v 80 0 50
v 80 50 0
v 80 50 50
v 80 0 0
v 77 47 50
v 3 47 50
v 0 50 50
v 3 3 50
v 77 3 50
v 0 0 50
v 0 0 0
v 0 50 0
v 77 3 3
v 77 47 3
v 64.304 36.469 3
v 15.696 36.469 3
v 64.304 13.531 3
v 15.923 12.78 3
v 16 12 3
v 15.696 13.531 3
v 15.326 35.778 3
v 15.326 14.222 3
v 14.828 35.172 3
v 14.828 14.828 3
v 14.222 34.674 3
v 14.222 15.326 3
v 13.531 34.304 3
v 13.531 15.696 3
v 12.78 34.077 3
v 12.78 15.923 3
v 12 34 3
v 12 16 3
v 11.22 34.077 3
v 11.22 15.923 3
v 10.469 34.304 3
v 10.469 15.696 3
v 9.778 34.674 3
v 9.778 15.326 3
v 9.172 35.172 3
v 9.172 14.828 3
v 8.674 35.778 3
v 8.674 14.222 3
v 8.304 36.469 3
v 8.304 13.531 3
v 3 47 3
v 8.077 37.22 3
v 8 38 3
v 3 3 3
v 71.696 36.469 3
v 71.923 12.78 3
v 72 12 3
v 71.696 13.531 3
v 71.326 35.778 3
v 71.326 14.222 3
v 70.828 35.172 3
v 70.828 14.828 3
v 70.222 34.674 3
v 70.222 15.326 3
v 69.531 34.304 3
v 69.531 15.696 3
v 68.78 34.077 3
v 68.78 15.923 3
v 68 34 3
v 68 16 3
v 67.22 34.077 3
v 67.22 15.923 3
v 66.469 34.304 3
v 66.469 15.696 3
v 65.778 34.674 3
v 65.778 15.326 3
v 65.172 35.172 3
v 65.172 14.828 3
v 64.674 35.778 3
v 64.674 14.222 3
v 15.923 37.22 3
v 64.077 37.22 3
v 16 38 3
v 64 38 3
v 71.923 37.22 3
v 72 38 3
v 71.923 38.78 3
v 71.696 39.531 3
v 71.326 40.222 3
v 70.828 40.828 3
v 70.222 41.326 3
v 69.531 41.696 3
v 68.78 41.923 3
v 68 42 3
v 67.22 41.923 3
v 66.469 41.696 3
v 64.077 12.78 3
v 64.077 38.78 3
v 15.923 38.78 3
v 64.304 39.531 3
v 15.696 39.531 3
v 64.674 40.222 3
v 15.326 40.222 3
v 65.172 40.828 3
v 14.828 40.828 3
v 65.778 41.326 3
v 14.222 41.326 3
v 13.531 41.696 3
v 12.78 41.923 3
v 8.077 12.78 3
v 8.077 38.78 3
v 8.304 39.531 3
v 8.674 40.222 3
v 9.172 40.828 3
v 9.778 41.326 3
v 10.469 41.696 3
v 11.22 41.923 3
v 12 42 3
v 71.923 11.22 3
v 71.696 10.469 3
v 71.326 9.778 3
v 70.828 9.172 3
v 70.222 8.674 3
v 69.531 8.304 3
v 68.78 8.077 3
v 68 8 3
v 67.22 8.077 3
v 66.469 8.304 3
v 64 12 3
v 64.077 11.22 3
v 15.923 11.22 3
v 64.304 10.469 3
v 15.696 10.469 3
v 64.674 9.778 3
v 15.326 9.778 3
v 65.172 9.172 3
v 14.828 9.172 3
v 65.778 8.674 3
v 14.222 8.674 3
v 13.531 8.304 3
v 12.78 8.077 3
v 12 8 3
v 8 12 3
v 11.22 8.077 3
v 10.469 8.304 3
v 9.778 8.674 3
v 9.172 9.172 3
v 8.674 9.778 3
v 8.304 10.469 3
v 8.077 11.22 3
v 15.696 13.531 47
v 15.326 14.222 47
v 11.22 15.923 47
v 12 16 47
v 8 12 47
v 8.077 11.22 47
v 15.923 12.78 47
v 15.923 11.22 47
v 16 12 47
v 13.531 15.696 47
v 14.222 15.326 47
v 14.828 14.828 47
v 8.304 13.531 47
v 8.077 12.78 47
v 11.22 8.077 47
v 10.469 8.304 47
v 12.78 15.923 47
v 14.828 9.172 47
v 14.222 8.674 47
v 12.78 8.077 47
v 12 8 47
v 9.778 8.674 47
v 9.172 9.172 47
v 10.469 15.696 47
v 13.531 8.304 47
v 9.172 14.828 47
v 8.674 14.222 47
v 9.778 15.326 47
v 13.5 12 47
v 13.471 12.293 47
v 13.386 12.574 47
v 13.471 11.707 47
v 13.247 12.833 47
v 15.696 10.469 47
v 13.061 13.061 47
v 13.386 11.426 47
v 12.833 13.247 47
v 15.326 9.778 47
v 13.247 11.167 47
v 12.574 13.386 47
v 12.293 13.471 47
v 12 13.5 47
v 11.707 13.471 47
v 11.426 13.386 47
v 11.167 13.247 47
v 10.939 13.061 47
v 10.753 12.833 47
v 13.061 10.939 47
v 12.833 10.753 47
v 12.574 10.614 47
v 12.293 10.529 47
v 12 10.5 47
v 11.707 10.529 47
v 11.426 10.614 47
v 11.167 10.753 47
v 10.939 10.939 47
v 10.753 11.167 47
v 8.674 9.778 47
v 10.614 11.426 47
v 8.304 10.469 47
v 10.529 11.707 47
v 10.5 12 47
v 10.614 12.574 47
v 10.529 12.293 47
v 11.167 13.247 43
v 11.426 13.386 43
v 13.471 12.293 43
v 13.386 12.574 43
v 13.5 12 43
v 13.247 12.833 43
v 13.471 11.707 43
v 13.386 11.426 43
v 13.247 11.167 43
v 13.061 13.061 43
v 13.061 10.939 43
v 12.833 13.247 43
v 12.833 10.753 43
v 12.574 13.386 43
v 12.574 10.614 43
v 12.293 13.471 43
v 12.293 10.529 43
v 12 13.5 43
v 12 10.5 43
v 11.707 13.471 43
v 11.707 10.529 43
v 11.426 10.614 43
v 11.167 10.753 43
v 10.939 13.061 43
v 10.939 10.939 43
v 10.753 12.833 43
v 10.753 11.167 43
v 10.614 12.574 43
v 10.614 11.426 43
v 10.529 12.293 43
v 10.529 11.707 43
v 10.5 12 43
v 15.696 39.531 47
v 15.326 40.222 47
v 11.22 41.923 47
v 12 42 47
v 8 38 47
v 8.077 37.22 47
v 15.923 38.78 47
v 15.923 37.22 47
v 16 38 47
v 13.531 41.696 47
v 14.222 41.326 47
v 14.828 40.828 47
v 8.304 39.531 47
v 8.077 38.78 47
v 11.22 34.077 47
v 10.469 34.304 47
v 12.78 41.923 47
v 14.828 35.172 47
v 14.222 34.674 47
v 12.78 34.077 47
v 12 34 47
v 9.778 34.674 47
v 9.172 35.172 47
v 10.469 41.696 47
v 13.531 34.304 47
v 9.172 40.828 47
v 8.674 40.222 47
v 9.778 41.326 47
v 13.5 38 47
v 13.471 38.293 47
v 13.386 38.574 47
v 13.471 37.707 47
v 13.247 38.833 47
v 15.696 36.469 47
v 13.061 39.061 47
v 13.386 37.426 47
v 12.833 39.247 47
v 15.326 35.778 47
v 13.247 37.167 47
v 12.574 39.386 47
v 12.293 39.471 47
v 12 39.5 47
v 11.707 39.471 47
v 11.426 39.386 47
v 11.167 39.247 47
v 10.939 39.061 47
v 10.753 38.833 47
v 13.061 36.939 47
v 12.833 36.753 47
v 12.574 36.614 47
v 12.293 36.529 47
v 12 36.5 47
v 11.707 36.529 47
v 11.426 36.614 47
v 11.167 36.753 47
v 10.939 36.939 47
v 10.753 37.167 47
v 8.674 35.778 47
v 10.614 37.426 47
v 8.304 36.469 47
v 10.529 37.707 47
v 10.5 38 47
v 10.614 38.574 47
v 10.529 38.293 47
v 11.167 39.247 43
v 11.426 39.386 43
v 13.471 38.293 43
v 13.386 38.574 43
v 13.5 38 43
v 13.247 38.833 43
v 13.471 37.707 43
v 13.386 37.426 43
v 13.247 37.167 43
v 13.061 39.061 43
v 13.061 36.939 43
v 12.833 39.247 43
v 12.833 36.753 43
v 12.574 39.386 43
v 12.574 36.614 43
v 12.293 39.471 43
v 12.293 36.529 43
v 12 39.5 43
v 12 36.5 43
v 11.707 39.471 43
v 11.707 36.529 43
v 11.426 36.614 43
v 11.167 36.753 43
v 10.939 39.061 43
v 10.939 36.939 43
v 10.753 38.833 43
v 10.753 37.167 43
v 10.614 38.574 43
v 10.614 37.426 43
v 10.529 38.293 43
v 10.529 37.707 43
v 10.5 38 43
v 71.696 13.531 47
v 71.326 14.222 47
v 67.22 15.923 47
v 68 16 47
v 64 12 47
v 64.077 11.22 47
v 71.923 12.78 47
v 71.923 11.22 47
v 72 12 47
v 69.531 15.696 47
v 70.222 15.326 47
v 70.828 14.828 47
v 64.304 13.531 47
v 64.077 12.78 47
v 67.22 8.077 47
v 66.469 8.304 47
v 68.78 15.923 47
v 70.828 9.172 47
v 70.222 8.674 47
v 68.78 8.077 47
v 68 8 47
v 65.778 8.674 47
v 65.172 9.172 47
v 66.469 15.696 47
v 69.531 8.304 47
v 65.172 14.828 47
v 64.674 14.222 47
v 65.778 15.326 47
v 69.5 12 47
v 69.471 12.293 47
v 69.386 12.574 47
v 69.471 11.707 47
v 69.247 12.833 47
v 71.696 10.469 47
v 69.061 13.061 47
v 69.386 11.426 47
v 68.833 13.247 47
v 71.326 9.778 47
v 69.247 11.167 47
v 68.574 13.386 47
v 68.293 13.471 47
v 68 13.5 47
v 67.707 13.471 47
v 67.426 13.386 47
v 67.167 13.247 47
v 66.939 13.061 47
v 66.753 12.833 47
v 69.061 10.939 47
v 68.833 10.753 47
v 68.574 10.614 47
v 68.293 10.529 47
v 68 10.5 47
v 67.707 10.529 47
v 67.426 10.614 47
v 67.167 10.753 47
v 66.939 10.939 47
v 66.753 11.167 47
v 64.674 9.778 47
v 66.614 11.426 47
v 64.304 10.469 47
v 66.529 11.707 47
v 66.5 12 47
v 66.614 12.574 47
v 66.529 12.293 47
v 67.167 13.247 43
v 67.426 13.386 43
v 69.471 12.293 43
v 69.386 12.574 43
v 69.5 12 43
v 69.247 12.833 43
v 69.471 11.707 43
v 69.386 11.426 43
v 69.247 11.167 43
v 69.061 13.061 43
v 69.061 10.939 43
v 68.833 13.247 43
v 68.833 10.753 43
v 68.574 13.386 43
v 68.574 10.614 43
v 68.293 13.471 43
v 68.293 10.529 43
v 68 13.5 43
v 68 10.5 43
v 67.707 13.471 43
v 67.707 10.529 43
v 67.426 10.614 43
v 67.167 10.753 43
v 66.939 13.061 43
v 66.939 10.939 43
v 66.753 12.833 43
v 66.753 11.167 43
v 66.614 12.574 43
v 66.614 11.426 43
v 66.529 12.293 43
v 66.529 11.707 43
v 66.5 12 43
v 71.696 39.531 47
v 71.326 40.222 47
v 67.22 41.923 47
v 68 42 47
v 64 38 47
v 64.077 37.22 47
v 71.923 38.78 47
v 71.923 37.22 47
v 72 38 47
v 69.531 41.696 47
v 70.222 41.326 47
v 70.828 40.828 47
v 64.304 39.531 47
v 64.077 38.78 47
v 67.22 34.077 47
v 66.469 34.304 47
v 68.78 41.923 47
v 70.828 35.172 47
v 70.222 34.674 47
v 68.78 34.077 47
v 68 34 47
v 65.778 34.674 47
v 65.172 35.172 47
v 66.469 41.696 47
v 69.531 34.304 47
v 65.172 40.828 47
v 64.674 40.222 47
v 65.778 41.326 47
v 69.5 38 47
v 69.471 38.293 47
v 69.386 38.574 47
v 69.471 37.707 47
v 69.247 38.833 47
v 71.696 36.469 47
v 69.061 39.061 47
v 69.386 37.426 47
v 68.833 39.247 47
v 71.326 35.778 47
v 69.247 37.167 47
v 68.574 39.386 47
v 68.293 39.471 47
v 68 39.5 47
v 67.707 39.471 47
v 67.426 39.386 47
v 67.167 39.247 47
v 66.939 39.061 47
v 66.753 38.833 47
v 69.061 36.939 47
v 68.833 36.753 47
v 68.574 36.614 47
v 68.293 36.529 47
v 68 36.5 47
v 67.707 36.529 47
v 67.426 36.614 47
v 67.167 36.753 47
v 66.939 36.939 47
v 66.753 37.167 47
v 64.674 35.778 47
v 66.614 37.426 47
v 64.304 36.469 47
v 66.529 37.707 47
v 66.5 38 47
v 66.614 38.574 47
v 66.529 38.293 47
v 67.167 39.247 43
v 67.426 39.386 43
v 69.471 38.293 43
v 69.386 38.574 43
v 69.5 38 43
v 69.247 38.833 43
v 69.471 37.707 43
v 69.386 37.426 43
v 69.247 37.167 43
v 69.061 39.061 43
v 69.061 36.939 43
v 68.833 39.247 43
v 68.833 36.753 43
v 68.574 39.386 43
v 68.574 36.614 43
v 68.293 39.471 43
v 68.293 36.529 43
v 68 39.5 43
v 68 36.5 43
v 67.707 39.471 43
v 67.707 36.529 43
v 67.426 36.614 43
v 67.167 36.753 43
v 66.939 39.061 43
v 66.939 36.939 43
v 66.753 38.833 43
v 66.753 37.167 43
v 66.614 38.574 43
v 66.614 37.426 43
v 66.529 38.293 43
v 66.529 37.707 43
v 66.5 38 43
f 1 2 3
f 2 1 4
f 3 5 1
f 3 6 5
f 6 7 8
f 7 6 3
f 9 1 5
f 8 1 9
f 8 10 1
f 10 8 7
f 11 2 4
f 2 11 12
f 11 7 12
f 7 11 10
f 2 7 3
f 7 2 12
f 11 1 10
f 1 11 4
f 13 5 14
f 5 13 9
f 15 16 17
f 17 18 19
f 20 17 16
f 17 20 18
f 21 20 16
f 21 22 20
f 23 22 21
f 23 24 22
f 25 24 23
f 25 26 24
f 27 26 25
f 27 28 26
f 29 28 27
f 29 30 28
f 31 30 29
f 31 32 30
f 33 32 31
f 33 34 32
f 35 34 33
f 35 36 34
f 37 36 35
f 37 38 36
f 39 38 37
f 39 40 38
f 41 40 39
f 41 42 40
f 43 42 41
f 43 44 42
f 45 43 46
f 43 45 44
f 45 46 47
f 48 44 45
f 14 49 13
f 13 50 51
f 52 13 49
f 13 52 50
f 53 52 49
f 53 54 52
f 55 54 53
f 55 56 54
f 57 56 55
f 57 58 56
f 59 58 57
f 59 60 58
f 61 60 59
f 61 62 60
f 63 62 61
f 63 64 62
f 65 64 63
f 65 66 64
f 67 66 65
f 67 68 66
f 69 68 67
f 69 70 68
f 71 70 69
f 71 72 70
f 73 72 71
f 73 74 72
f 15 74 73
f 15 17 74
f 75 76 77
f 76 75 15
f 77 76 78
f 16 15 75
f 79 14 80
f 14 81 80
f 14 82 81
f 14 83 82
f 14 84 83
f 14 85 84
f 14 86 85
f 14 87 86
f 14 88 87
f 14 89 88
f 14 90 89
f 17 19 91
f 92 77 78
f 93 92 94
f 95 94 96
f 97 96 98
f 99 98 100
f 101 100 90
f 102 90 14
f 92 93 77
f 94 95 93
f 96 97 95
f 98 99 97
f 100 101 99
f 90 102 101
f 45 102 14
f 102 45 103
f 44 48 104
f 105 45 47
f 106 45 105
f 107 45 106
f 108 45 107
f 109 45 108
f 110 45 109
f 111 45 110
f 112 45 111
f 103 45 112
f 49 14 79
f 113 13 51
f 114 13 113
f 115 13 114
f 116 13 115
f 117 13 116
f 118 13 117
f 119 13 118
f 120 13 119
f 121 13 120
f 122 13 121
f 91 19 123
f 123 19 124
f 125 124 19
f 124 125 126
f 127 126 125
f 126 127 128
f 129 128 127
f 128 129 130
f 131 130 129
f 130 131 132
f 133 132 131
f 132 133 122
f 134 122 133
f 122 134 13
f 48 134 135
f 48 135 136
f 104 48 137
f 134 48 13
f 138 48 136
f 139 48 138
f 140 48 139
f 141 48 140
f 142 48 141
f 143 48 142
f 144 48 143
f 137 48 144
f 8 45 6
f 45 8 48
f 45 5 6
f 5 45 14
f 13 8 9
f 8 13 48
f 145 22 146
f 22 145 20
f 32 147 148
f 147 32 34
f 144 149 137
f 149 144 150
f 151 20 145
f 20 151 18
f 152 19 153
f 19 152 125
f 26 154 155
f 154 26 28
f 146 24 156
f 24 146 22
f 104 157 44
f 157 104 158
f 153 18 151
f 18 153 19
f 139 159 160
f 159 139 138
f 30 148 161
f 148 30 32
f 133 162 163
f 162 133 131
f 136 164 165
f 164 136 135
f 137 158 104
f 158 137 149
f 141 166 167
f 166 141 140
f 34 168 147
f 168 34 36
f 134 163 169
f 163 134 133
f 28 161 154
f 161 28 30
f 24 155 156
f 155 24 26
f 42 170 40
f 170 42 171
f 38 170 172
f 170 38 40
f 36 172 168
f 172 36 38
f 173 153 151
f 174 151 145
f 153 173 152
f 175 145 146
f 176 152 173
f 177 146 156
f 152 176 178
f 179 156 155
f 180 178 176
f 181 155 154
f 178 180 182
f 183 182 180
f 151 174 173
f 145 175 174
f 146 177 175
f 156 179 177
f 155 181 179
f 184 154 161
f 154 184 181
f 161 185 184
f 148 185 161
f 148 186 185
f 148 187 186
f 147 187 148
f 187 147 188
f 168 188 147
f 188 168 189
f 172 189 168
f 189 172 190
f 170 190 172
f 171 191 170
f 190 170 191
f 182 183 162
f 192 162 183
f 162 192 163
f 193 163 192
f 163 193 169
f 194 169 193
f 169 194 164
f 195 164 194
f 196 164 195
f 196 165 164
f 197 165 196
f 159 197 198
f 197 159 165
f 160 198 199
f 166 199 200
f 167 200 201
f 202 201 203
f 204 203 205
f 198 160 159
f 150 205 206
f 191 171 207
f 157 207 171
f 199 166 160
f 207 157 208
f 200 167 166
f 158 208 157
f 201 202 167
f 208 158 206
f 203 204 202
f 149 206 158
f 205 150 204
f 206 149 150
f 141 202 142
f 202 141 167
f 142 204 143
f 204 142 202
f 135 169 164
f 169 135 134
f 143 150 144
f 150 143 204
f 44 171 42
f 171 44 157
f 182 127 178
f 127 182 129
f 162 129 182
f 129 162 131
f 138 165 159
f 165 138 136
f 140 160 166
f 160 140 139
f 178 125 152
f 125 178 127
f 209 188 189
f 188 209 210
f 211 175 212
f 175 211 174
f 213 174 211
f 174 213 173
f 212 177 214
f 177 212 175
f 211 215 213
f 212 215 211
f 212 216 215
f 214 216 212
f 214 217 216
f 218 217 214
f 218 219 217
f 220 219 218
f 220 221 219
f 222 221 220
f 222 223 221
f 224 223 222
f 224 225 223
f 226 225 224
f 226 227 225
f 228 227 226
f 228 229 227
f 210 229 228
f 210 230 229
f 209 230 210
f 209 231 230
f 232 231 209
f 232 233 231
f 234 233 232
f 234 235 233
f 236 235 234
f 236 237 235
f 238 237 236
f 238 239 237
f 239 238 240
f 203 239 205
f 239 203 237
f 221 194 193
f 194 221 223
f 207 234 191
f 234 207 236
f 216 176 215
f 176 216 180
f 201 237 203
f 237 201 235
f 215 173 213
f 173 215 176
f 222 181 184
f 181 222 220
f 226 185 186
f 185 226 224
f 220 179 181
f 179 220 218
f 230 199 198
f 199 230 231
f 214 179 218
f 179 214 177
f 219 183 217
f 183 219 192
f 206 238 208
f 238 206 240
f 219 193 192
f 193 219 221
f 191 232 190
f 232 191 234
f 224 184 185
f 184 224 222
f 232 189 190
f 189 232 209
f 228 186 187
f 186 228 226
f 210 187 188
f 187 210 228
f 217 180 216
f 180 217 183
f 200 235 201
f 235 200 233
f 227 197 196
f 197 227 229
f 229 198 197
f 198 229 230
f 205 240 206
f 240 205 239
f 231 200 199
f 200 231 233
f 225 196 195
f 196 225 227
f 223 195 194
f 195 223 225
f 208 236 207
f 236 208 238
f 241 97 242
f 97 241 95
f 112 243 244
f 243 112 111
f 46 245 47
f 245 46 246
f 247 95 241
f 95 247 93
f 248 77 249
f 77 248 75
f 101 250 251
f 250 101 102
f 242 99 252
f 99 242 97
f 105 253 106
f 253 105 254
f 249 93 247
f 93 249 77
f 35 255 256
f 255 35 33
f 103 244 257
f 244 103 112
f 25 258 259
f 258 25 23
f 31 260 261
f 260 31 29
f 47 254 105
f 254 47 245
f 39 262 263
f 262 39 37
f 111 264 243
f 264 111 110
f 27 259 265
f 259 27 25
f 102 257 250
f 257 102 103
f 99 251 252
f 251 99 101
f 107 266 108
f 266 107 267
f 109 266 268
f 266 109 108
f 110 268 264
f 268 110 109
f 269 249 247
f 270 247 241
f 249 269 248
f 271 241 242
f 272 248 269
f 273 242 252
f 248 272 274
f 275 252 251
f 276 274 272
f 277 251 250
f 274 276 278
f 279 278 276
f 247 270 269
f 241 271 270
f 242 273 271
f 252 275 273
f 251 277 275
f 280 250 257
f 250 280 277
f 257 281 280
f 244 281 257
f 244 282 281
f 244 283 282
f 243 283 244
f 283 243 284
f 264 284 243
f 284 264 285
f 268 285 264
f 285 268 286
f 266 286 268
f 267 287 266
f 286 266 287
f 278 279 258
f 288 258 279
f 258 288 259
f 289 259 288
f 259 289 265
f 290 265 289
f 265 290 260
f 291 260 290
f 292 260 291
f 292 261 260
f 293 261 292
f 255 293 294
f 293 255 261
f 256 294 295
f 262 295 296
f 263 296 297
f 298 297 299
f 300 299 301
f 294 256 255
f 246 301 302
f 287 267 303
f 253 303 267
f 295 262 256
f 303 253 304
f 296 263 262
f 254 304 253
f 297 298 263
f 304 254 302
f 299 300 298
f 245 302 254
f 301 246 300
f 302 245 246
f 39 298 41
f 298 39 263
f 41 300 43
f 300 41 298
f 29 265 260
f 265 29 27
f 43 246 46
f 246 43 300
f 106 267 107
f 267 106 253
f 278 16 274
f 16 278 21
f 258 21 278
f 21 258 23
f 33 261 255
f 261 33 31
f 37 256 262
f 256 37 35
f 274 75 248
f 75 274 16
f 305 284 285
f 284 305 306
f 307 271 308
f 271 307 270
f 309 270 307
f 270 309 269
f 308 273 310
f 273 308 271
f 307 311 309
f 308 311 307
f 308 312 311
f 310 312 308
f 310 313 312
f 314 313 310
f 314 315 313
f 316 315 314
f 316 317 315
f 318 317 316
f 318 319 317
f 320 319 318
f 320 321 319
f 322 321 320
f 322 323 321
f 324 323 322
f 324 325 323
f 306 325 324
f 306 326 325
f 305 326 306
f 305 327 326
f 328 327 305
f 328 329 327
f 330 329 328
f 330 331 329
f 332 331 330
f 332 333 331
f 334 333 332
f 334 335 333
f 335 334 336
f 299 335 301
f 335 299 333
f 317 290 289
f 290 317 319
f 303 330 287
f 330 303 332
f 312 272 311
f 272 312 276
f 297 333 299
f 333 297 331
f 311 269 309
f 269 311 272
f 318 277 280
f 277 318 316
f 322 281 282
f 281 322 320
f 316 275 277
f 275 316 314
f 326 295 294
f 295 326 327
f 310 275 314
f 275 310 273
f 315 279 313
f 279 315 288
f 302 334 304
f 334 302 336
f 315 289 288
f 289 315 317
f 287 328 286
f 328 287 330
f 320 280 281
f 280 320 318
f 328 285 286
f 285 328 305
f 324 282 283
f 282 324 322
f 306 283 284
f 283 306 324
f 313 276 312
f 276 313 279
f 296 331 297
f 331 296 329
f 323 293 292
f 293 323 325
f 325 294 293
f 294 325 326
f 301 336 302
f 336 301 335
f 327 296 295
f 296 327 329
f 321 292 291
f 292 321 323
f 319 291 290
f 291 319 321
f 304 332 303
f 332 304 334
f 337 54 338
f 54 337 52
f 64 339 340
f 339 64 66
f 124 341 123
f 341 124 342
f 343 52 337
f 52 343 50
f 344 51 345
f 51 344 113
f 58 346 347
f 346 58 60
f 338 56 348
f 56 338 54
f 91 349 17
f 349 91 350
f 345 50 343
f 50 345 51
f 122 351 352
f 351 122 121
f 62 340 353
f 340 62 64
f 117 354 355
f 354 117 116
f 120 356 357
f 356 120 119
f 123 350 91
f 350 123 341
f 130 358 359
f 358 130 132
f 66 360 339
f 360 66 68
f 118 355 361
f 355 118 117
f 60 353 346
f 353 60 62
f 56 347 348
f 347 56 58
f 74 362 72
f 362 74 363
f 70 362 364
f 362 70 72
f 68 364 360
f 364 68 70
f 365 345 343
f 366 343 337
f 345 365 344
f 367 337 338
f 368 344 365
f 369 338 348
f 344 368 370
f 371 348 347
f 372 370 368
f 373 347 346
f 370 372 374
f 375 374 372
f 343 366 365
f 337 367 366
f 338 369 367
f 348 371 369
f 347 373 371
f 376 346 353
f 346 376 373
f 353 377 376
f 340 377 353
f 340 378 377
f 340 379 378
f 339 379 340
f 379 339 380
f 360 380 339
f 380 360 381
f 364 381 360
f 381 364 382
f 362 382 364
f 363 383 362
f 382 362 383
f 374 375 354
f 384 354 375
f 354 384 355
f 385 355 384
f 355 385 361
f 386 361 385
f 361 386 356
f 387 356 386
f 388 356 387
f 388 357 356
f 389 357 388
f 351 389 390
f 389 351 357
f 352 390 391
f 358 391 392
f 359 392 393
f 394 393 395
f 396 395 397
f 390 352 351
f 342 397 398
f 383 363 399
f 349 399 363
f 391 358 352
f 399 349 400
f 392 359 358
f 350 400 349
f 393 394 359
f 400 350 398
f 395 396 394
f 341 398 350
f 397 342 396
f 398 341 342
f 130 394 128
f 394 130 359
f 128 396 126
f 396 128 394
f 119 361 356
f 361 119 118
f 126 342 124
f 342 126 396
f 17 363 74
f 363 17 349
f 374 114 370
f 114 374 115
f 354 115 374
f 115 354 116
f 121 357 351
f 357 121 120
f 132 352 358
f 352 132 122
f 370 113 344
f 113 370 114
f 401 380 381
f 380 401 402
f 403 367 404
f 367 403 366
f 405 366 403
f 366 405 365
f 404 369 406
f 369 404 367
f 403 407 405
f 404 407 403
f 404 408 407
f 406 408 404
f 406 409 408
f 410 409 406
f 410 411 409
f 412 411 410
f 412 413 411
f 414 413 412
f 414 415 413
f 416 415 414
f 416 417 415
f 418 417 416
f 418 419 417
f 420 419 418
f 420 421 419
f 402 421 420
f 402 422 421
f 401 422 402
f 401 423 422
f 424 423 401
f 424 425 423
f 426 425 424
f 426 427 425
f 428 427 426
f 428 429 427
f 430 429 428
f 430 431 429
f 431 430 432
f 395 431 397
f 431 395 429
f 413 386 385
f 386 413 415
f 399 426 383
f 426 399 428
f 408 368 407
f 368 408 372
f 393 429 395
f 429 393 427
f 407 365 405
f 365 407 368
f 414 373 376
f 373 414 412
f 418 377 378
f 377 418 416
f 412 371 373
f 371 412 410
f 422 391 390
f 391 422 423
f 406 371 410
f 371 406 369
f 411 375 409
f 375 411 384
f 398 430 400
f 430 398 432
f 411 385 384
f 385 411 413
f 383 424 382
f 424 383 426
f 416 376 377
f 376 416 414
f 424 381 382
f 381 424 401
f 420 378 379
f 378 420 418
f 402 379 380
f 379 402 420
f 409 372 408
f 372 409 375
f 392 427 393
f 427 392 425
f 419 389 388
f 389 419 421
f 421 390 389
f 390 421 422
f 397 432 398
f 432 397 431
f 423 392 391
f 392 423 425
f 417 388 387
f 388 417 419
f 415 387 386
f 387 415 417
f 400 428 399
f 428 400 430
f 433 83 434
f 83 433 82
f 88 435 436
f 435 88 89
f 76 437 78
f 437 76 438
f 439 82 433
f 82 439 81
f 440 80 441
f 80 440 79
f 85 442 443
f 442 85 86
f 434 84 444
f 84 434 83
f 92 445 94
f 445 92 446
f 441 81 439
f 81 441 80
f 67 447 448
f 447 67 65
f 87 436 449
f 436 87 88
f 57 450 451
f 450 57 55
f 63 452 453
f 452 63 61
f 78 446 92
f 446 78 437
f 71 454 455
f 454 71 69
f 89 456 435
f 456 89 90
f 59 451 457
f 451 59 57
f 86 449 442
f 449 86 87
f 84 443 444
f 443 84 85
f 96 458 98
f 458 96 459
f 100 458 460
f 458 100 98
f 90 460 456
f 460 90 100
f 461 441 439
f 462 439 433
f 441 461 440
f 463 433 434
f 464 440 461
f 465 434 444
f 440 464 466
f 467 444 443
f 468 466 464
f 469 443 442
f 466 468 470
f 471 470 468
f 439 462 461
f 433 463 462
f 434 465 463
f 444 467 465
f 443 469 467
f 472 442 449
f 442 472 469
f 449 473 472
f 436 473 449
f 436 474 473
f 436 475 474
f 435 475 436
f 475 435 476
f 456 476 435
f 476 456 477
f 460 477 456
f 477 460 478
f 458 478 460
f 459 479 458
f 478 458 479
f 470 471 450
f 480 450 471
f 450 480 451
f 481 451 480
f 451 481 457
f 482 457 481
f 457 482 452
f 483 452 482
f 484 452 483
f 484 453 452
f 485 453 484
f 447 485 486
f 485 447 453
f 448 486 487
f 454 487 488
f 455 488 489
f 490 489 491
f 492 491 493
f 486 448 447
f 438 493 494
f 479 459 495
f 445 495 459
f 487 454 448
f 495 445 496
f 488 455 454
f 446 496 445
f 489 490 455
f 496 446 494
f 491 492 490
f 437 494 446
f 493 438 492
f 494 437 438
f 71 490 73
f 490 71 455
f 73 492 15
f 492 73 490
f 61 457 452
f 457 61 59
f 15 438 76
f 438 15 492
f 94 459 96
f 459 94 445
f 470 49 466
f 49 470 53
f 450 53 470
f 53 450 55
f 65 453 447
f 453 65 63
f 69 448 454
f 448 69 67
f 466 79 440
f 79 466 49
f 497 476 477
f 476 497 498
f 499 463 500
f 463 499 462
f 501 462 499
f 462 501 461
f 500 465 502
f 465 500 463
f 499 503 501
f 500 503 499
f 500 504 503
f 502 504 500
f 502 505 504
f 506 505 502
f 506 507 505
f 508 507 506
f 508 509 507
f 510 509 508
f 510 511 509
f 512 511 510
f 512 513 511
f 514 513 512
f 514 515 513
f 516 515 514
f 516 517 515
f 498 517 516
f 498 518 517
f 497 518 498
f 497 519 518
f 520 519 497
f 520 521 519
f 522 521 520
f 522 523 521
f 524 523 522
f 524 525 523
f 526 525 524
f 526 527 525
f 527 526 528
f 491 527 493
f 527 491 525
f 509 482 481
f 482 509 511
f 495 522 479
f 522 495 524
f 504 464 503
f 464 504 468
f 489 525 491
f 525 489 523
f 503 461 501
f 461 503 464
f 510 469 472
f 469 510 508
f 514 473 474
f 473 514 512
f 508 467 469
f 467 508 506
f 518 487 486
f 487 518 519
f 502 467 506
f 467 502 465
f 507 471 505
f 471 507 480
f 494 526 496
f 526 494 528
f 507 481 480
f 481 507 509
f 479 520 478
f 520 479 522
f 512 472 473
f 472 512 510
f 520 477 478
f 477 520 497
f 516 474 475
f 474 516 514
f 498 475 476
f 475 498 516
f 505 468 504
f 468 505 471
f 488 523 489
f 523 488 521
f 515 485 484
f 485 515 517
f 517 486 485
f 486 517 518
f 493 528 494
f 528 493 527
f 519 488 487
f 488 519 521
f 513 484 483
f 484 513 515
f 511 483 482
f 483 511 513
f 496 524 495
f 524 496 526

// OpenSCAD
$fn = 32;

// ----------------------------------------------------------------------
// Enclosure box: bosses enclosure
// ----------------------------------------------------------------------

// --- parameters (mm) ---
box_l = 80;               // outer length, X
box_w = 50;               // outer width, Y
box_h = 50;               // outer height
wall_t = 3;               // wall thickness
boss_r = 4;               // corner boss radius
hole_r = 1.5;             // boss screw hole radius
boss_in = 12;             // boss inset from the corners

inner_h = box_h - wall_t;  // cavity depth
boss_h = inner_h - 2;  // corner boss height

difference() {
  union() {
    difference() {
      cube([box_l, box_w, box_h]);
      translate([wall_t, wall_t, wall_t])
        cube([box_l - 2 * wall_t, box_w - 2 * wall_t, box_h]);
    }
    for (sx = [0, 1], sy = [0, 1])
      translate([sx ? box_l - boss_in : boss_in,
                 sy ? box_w - boss_in : boss_in, wall_t - 1])
        difference() {
          cylinder(r = boss_r, h = boss_h);
          translate([0, 0, boss_h - 4])
            cylinder(r = hole_r, h = 5);
        }
  }
}
